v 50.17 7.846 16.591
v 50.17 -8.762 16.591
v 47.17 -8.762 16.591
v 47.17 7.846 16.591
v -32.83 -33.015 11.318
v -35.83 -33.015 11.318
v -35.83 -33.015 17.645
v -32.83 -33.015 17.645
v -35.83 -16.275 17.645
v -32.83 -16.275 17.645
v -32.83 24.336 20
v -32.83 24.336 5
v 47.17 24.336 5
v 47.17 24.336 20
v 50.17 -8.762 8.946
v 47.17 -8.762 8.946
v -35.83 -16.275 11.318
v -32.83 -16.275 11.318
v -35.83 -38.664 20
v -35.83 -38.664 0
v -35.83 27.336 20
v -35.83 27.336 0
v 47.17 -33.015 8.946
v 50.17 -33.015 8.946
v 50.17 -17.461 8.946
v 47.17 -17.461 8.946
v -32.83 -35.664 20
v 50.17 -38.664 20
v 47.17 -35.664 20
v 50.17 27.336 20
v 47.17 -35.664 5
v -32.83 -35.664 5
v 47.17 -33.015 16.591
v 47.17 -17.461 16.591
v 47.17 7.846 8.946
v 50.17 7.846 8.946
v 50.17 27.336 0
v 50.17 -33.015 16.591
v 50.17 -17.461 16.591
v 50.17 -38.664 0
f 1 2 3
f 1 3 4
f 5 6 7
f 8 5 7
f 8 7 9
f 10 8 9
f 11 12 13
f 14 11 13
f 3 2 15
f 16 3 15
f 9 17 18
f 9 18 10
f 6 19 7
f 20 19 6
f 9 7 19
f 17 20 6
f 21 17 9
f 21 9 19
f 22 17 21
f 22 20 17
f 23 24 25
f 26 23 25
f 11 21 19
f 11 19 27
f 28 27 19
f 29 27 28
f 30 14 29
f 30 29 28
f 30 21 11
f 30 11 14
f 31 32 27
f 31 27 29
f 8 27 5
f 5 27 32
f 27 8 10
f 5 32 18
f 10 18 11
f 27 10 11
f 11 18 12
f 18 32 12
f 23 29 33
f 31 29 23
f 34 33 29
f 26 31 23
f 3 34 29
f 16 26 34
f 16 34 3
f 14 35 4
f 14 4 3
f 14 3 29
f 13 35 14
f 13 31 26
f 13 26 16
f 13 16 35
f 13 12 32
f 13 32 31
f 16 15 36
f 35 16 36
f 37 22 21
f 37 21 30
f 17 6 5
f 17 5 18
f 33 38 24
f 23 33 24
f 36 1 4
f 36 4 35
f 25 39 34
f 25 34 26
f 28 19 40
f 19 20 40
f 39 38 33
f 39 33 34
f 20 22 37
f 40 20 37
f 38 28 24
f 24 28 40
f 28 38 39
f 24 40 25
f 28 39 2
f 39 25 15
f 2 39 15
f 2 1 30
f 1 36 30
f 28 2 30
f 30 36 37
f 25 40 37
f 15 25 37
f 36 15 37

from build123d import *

# Parameters (mm, degrees)
ESQUISSE4_W             = 86
ESQUISSE4_H             = 66
BOSS_EXTRU_3_DEPTH      = 5
ESQUISSE5_W             = 86
ESQUISSE5_H             = 66
ESQUISSE5_W_2           = 80
ESQUISSE5_H_2           = 60
BOSS_EXTRU_5_DEPTH      = 15
ESQUISSE7_W             = 6.326895014
ESQUISSE7_H             = 16.739909725
ENL_V_MAT_EXTRU_3_DEPTH = 15
ESQUISSE8_W             = 7.644998142
ESQUISSE8_H             = 15.55361691
ESQUISSE8_H_2           = 16.608099413
ENL_V_MAT_EXTRU_4_DEPTH = 15


with BuildPart() as part:
    # Esquisse4 → Boss.-Extru.3 (new body)
    with BuildSketch(Plane.XY):
        with Locations((7.16988417, -5.664092664)):
            Rectangle(ESQUISSE4_W, ESQUISSE4_H)
    extrude(amount=BOSS_EXTRU_3_DEPTH)

    # Esquisse5 → Boss.-Extru.5 (add)
    with BuildSketch(Plane.XY.offset(5)):
        with Locations((7.16988417, -5.664092664)):
            Rectangle(ESQUISSE5_W, ESQUISSE5_H)
        with Locations((7.16988417, -5.664092664)):
            Rectangle(ESQUISSE5_W_2, ESQUISSE5_H_2, mode=Mode.SUBTRACT)
    extrude(amount=BOSS_EXTRU_5_DEPTH)

    # Esquisse7 → Enlèv. mat.-Extru.3 (cut)
    with BuildSketch(Plane.ZY.offset(35.83011583)):
        with Locations((14.481550635, -24.644777708)):
            Rectangle(ESQUISSE7_W, ESQUISSE7_H)
    extrude(amount=-ENL_V_MAT_EXTRU_3_DEPTH, mode=Mode.SUBTRACT)

    # Esquisse8 → Enlèv. mat.-Extru.4 (cut)
    with BuildSketch(Plane(origin=(50.16988417, 0, 0), x_dir=(0, 0, -1), z_dir=(1, 0, 0))):
        with Locations((-12.768016569, -25.237924115)):
            Rectangle(ESQUISSE8_W, ESQUISSE8_H)
        with Locations((-12.768016569, -0.457585309)):
            Rectangle(ESQUISSE8_W, ESQUISSE8_H_2)
    extrude(amount=-ENL_V_MAT_EXTRU_4_DEPTH, mode=Mode.SUBTRACT)


solid = part.part
